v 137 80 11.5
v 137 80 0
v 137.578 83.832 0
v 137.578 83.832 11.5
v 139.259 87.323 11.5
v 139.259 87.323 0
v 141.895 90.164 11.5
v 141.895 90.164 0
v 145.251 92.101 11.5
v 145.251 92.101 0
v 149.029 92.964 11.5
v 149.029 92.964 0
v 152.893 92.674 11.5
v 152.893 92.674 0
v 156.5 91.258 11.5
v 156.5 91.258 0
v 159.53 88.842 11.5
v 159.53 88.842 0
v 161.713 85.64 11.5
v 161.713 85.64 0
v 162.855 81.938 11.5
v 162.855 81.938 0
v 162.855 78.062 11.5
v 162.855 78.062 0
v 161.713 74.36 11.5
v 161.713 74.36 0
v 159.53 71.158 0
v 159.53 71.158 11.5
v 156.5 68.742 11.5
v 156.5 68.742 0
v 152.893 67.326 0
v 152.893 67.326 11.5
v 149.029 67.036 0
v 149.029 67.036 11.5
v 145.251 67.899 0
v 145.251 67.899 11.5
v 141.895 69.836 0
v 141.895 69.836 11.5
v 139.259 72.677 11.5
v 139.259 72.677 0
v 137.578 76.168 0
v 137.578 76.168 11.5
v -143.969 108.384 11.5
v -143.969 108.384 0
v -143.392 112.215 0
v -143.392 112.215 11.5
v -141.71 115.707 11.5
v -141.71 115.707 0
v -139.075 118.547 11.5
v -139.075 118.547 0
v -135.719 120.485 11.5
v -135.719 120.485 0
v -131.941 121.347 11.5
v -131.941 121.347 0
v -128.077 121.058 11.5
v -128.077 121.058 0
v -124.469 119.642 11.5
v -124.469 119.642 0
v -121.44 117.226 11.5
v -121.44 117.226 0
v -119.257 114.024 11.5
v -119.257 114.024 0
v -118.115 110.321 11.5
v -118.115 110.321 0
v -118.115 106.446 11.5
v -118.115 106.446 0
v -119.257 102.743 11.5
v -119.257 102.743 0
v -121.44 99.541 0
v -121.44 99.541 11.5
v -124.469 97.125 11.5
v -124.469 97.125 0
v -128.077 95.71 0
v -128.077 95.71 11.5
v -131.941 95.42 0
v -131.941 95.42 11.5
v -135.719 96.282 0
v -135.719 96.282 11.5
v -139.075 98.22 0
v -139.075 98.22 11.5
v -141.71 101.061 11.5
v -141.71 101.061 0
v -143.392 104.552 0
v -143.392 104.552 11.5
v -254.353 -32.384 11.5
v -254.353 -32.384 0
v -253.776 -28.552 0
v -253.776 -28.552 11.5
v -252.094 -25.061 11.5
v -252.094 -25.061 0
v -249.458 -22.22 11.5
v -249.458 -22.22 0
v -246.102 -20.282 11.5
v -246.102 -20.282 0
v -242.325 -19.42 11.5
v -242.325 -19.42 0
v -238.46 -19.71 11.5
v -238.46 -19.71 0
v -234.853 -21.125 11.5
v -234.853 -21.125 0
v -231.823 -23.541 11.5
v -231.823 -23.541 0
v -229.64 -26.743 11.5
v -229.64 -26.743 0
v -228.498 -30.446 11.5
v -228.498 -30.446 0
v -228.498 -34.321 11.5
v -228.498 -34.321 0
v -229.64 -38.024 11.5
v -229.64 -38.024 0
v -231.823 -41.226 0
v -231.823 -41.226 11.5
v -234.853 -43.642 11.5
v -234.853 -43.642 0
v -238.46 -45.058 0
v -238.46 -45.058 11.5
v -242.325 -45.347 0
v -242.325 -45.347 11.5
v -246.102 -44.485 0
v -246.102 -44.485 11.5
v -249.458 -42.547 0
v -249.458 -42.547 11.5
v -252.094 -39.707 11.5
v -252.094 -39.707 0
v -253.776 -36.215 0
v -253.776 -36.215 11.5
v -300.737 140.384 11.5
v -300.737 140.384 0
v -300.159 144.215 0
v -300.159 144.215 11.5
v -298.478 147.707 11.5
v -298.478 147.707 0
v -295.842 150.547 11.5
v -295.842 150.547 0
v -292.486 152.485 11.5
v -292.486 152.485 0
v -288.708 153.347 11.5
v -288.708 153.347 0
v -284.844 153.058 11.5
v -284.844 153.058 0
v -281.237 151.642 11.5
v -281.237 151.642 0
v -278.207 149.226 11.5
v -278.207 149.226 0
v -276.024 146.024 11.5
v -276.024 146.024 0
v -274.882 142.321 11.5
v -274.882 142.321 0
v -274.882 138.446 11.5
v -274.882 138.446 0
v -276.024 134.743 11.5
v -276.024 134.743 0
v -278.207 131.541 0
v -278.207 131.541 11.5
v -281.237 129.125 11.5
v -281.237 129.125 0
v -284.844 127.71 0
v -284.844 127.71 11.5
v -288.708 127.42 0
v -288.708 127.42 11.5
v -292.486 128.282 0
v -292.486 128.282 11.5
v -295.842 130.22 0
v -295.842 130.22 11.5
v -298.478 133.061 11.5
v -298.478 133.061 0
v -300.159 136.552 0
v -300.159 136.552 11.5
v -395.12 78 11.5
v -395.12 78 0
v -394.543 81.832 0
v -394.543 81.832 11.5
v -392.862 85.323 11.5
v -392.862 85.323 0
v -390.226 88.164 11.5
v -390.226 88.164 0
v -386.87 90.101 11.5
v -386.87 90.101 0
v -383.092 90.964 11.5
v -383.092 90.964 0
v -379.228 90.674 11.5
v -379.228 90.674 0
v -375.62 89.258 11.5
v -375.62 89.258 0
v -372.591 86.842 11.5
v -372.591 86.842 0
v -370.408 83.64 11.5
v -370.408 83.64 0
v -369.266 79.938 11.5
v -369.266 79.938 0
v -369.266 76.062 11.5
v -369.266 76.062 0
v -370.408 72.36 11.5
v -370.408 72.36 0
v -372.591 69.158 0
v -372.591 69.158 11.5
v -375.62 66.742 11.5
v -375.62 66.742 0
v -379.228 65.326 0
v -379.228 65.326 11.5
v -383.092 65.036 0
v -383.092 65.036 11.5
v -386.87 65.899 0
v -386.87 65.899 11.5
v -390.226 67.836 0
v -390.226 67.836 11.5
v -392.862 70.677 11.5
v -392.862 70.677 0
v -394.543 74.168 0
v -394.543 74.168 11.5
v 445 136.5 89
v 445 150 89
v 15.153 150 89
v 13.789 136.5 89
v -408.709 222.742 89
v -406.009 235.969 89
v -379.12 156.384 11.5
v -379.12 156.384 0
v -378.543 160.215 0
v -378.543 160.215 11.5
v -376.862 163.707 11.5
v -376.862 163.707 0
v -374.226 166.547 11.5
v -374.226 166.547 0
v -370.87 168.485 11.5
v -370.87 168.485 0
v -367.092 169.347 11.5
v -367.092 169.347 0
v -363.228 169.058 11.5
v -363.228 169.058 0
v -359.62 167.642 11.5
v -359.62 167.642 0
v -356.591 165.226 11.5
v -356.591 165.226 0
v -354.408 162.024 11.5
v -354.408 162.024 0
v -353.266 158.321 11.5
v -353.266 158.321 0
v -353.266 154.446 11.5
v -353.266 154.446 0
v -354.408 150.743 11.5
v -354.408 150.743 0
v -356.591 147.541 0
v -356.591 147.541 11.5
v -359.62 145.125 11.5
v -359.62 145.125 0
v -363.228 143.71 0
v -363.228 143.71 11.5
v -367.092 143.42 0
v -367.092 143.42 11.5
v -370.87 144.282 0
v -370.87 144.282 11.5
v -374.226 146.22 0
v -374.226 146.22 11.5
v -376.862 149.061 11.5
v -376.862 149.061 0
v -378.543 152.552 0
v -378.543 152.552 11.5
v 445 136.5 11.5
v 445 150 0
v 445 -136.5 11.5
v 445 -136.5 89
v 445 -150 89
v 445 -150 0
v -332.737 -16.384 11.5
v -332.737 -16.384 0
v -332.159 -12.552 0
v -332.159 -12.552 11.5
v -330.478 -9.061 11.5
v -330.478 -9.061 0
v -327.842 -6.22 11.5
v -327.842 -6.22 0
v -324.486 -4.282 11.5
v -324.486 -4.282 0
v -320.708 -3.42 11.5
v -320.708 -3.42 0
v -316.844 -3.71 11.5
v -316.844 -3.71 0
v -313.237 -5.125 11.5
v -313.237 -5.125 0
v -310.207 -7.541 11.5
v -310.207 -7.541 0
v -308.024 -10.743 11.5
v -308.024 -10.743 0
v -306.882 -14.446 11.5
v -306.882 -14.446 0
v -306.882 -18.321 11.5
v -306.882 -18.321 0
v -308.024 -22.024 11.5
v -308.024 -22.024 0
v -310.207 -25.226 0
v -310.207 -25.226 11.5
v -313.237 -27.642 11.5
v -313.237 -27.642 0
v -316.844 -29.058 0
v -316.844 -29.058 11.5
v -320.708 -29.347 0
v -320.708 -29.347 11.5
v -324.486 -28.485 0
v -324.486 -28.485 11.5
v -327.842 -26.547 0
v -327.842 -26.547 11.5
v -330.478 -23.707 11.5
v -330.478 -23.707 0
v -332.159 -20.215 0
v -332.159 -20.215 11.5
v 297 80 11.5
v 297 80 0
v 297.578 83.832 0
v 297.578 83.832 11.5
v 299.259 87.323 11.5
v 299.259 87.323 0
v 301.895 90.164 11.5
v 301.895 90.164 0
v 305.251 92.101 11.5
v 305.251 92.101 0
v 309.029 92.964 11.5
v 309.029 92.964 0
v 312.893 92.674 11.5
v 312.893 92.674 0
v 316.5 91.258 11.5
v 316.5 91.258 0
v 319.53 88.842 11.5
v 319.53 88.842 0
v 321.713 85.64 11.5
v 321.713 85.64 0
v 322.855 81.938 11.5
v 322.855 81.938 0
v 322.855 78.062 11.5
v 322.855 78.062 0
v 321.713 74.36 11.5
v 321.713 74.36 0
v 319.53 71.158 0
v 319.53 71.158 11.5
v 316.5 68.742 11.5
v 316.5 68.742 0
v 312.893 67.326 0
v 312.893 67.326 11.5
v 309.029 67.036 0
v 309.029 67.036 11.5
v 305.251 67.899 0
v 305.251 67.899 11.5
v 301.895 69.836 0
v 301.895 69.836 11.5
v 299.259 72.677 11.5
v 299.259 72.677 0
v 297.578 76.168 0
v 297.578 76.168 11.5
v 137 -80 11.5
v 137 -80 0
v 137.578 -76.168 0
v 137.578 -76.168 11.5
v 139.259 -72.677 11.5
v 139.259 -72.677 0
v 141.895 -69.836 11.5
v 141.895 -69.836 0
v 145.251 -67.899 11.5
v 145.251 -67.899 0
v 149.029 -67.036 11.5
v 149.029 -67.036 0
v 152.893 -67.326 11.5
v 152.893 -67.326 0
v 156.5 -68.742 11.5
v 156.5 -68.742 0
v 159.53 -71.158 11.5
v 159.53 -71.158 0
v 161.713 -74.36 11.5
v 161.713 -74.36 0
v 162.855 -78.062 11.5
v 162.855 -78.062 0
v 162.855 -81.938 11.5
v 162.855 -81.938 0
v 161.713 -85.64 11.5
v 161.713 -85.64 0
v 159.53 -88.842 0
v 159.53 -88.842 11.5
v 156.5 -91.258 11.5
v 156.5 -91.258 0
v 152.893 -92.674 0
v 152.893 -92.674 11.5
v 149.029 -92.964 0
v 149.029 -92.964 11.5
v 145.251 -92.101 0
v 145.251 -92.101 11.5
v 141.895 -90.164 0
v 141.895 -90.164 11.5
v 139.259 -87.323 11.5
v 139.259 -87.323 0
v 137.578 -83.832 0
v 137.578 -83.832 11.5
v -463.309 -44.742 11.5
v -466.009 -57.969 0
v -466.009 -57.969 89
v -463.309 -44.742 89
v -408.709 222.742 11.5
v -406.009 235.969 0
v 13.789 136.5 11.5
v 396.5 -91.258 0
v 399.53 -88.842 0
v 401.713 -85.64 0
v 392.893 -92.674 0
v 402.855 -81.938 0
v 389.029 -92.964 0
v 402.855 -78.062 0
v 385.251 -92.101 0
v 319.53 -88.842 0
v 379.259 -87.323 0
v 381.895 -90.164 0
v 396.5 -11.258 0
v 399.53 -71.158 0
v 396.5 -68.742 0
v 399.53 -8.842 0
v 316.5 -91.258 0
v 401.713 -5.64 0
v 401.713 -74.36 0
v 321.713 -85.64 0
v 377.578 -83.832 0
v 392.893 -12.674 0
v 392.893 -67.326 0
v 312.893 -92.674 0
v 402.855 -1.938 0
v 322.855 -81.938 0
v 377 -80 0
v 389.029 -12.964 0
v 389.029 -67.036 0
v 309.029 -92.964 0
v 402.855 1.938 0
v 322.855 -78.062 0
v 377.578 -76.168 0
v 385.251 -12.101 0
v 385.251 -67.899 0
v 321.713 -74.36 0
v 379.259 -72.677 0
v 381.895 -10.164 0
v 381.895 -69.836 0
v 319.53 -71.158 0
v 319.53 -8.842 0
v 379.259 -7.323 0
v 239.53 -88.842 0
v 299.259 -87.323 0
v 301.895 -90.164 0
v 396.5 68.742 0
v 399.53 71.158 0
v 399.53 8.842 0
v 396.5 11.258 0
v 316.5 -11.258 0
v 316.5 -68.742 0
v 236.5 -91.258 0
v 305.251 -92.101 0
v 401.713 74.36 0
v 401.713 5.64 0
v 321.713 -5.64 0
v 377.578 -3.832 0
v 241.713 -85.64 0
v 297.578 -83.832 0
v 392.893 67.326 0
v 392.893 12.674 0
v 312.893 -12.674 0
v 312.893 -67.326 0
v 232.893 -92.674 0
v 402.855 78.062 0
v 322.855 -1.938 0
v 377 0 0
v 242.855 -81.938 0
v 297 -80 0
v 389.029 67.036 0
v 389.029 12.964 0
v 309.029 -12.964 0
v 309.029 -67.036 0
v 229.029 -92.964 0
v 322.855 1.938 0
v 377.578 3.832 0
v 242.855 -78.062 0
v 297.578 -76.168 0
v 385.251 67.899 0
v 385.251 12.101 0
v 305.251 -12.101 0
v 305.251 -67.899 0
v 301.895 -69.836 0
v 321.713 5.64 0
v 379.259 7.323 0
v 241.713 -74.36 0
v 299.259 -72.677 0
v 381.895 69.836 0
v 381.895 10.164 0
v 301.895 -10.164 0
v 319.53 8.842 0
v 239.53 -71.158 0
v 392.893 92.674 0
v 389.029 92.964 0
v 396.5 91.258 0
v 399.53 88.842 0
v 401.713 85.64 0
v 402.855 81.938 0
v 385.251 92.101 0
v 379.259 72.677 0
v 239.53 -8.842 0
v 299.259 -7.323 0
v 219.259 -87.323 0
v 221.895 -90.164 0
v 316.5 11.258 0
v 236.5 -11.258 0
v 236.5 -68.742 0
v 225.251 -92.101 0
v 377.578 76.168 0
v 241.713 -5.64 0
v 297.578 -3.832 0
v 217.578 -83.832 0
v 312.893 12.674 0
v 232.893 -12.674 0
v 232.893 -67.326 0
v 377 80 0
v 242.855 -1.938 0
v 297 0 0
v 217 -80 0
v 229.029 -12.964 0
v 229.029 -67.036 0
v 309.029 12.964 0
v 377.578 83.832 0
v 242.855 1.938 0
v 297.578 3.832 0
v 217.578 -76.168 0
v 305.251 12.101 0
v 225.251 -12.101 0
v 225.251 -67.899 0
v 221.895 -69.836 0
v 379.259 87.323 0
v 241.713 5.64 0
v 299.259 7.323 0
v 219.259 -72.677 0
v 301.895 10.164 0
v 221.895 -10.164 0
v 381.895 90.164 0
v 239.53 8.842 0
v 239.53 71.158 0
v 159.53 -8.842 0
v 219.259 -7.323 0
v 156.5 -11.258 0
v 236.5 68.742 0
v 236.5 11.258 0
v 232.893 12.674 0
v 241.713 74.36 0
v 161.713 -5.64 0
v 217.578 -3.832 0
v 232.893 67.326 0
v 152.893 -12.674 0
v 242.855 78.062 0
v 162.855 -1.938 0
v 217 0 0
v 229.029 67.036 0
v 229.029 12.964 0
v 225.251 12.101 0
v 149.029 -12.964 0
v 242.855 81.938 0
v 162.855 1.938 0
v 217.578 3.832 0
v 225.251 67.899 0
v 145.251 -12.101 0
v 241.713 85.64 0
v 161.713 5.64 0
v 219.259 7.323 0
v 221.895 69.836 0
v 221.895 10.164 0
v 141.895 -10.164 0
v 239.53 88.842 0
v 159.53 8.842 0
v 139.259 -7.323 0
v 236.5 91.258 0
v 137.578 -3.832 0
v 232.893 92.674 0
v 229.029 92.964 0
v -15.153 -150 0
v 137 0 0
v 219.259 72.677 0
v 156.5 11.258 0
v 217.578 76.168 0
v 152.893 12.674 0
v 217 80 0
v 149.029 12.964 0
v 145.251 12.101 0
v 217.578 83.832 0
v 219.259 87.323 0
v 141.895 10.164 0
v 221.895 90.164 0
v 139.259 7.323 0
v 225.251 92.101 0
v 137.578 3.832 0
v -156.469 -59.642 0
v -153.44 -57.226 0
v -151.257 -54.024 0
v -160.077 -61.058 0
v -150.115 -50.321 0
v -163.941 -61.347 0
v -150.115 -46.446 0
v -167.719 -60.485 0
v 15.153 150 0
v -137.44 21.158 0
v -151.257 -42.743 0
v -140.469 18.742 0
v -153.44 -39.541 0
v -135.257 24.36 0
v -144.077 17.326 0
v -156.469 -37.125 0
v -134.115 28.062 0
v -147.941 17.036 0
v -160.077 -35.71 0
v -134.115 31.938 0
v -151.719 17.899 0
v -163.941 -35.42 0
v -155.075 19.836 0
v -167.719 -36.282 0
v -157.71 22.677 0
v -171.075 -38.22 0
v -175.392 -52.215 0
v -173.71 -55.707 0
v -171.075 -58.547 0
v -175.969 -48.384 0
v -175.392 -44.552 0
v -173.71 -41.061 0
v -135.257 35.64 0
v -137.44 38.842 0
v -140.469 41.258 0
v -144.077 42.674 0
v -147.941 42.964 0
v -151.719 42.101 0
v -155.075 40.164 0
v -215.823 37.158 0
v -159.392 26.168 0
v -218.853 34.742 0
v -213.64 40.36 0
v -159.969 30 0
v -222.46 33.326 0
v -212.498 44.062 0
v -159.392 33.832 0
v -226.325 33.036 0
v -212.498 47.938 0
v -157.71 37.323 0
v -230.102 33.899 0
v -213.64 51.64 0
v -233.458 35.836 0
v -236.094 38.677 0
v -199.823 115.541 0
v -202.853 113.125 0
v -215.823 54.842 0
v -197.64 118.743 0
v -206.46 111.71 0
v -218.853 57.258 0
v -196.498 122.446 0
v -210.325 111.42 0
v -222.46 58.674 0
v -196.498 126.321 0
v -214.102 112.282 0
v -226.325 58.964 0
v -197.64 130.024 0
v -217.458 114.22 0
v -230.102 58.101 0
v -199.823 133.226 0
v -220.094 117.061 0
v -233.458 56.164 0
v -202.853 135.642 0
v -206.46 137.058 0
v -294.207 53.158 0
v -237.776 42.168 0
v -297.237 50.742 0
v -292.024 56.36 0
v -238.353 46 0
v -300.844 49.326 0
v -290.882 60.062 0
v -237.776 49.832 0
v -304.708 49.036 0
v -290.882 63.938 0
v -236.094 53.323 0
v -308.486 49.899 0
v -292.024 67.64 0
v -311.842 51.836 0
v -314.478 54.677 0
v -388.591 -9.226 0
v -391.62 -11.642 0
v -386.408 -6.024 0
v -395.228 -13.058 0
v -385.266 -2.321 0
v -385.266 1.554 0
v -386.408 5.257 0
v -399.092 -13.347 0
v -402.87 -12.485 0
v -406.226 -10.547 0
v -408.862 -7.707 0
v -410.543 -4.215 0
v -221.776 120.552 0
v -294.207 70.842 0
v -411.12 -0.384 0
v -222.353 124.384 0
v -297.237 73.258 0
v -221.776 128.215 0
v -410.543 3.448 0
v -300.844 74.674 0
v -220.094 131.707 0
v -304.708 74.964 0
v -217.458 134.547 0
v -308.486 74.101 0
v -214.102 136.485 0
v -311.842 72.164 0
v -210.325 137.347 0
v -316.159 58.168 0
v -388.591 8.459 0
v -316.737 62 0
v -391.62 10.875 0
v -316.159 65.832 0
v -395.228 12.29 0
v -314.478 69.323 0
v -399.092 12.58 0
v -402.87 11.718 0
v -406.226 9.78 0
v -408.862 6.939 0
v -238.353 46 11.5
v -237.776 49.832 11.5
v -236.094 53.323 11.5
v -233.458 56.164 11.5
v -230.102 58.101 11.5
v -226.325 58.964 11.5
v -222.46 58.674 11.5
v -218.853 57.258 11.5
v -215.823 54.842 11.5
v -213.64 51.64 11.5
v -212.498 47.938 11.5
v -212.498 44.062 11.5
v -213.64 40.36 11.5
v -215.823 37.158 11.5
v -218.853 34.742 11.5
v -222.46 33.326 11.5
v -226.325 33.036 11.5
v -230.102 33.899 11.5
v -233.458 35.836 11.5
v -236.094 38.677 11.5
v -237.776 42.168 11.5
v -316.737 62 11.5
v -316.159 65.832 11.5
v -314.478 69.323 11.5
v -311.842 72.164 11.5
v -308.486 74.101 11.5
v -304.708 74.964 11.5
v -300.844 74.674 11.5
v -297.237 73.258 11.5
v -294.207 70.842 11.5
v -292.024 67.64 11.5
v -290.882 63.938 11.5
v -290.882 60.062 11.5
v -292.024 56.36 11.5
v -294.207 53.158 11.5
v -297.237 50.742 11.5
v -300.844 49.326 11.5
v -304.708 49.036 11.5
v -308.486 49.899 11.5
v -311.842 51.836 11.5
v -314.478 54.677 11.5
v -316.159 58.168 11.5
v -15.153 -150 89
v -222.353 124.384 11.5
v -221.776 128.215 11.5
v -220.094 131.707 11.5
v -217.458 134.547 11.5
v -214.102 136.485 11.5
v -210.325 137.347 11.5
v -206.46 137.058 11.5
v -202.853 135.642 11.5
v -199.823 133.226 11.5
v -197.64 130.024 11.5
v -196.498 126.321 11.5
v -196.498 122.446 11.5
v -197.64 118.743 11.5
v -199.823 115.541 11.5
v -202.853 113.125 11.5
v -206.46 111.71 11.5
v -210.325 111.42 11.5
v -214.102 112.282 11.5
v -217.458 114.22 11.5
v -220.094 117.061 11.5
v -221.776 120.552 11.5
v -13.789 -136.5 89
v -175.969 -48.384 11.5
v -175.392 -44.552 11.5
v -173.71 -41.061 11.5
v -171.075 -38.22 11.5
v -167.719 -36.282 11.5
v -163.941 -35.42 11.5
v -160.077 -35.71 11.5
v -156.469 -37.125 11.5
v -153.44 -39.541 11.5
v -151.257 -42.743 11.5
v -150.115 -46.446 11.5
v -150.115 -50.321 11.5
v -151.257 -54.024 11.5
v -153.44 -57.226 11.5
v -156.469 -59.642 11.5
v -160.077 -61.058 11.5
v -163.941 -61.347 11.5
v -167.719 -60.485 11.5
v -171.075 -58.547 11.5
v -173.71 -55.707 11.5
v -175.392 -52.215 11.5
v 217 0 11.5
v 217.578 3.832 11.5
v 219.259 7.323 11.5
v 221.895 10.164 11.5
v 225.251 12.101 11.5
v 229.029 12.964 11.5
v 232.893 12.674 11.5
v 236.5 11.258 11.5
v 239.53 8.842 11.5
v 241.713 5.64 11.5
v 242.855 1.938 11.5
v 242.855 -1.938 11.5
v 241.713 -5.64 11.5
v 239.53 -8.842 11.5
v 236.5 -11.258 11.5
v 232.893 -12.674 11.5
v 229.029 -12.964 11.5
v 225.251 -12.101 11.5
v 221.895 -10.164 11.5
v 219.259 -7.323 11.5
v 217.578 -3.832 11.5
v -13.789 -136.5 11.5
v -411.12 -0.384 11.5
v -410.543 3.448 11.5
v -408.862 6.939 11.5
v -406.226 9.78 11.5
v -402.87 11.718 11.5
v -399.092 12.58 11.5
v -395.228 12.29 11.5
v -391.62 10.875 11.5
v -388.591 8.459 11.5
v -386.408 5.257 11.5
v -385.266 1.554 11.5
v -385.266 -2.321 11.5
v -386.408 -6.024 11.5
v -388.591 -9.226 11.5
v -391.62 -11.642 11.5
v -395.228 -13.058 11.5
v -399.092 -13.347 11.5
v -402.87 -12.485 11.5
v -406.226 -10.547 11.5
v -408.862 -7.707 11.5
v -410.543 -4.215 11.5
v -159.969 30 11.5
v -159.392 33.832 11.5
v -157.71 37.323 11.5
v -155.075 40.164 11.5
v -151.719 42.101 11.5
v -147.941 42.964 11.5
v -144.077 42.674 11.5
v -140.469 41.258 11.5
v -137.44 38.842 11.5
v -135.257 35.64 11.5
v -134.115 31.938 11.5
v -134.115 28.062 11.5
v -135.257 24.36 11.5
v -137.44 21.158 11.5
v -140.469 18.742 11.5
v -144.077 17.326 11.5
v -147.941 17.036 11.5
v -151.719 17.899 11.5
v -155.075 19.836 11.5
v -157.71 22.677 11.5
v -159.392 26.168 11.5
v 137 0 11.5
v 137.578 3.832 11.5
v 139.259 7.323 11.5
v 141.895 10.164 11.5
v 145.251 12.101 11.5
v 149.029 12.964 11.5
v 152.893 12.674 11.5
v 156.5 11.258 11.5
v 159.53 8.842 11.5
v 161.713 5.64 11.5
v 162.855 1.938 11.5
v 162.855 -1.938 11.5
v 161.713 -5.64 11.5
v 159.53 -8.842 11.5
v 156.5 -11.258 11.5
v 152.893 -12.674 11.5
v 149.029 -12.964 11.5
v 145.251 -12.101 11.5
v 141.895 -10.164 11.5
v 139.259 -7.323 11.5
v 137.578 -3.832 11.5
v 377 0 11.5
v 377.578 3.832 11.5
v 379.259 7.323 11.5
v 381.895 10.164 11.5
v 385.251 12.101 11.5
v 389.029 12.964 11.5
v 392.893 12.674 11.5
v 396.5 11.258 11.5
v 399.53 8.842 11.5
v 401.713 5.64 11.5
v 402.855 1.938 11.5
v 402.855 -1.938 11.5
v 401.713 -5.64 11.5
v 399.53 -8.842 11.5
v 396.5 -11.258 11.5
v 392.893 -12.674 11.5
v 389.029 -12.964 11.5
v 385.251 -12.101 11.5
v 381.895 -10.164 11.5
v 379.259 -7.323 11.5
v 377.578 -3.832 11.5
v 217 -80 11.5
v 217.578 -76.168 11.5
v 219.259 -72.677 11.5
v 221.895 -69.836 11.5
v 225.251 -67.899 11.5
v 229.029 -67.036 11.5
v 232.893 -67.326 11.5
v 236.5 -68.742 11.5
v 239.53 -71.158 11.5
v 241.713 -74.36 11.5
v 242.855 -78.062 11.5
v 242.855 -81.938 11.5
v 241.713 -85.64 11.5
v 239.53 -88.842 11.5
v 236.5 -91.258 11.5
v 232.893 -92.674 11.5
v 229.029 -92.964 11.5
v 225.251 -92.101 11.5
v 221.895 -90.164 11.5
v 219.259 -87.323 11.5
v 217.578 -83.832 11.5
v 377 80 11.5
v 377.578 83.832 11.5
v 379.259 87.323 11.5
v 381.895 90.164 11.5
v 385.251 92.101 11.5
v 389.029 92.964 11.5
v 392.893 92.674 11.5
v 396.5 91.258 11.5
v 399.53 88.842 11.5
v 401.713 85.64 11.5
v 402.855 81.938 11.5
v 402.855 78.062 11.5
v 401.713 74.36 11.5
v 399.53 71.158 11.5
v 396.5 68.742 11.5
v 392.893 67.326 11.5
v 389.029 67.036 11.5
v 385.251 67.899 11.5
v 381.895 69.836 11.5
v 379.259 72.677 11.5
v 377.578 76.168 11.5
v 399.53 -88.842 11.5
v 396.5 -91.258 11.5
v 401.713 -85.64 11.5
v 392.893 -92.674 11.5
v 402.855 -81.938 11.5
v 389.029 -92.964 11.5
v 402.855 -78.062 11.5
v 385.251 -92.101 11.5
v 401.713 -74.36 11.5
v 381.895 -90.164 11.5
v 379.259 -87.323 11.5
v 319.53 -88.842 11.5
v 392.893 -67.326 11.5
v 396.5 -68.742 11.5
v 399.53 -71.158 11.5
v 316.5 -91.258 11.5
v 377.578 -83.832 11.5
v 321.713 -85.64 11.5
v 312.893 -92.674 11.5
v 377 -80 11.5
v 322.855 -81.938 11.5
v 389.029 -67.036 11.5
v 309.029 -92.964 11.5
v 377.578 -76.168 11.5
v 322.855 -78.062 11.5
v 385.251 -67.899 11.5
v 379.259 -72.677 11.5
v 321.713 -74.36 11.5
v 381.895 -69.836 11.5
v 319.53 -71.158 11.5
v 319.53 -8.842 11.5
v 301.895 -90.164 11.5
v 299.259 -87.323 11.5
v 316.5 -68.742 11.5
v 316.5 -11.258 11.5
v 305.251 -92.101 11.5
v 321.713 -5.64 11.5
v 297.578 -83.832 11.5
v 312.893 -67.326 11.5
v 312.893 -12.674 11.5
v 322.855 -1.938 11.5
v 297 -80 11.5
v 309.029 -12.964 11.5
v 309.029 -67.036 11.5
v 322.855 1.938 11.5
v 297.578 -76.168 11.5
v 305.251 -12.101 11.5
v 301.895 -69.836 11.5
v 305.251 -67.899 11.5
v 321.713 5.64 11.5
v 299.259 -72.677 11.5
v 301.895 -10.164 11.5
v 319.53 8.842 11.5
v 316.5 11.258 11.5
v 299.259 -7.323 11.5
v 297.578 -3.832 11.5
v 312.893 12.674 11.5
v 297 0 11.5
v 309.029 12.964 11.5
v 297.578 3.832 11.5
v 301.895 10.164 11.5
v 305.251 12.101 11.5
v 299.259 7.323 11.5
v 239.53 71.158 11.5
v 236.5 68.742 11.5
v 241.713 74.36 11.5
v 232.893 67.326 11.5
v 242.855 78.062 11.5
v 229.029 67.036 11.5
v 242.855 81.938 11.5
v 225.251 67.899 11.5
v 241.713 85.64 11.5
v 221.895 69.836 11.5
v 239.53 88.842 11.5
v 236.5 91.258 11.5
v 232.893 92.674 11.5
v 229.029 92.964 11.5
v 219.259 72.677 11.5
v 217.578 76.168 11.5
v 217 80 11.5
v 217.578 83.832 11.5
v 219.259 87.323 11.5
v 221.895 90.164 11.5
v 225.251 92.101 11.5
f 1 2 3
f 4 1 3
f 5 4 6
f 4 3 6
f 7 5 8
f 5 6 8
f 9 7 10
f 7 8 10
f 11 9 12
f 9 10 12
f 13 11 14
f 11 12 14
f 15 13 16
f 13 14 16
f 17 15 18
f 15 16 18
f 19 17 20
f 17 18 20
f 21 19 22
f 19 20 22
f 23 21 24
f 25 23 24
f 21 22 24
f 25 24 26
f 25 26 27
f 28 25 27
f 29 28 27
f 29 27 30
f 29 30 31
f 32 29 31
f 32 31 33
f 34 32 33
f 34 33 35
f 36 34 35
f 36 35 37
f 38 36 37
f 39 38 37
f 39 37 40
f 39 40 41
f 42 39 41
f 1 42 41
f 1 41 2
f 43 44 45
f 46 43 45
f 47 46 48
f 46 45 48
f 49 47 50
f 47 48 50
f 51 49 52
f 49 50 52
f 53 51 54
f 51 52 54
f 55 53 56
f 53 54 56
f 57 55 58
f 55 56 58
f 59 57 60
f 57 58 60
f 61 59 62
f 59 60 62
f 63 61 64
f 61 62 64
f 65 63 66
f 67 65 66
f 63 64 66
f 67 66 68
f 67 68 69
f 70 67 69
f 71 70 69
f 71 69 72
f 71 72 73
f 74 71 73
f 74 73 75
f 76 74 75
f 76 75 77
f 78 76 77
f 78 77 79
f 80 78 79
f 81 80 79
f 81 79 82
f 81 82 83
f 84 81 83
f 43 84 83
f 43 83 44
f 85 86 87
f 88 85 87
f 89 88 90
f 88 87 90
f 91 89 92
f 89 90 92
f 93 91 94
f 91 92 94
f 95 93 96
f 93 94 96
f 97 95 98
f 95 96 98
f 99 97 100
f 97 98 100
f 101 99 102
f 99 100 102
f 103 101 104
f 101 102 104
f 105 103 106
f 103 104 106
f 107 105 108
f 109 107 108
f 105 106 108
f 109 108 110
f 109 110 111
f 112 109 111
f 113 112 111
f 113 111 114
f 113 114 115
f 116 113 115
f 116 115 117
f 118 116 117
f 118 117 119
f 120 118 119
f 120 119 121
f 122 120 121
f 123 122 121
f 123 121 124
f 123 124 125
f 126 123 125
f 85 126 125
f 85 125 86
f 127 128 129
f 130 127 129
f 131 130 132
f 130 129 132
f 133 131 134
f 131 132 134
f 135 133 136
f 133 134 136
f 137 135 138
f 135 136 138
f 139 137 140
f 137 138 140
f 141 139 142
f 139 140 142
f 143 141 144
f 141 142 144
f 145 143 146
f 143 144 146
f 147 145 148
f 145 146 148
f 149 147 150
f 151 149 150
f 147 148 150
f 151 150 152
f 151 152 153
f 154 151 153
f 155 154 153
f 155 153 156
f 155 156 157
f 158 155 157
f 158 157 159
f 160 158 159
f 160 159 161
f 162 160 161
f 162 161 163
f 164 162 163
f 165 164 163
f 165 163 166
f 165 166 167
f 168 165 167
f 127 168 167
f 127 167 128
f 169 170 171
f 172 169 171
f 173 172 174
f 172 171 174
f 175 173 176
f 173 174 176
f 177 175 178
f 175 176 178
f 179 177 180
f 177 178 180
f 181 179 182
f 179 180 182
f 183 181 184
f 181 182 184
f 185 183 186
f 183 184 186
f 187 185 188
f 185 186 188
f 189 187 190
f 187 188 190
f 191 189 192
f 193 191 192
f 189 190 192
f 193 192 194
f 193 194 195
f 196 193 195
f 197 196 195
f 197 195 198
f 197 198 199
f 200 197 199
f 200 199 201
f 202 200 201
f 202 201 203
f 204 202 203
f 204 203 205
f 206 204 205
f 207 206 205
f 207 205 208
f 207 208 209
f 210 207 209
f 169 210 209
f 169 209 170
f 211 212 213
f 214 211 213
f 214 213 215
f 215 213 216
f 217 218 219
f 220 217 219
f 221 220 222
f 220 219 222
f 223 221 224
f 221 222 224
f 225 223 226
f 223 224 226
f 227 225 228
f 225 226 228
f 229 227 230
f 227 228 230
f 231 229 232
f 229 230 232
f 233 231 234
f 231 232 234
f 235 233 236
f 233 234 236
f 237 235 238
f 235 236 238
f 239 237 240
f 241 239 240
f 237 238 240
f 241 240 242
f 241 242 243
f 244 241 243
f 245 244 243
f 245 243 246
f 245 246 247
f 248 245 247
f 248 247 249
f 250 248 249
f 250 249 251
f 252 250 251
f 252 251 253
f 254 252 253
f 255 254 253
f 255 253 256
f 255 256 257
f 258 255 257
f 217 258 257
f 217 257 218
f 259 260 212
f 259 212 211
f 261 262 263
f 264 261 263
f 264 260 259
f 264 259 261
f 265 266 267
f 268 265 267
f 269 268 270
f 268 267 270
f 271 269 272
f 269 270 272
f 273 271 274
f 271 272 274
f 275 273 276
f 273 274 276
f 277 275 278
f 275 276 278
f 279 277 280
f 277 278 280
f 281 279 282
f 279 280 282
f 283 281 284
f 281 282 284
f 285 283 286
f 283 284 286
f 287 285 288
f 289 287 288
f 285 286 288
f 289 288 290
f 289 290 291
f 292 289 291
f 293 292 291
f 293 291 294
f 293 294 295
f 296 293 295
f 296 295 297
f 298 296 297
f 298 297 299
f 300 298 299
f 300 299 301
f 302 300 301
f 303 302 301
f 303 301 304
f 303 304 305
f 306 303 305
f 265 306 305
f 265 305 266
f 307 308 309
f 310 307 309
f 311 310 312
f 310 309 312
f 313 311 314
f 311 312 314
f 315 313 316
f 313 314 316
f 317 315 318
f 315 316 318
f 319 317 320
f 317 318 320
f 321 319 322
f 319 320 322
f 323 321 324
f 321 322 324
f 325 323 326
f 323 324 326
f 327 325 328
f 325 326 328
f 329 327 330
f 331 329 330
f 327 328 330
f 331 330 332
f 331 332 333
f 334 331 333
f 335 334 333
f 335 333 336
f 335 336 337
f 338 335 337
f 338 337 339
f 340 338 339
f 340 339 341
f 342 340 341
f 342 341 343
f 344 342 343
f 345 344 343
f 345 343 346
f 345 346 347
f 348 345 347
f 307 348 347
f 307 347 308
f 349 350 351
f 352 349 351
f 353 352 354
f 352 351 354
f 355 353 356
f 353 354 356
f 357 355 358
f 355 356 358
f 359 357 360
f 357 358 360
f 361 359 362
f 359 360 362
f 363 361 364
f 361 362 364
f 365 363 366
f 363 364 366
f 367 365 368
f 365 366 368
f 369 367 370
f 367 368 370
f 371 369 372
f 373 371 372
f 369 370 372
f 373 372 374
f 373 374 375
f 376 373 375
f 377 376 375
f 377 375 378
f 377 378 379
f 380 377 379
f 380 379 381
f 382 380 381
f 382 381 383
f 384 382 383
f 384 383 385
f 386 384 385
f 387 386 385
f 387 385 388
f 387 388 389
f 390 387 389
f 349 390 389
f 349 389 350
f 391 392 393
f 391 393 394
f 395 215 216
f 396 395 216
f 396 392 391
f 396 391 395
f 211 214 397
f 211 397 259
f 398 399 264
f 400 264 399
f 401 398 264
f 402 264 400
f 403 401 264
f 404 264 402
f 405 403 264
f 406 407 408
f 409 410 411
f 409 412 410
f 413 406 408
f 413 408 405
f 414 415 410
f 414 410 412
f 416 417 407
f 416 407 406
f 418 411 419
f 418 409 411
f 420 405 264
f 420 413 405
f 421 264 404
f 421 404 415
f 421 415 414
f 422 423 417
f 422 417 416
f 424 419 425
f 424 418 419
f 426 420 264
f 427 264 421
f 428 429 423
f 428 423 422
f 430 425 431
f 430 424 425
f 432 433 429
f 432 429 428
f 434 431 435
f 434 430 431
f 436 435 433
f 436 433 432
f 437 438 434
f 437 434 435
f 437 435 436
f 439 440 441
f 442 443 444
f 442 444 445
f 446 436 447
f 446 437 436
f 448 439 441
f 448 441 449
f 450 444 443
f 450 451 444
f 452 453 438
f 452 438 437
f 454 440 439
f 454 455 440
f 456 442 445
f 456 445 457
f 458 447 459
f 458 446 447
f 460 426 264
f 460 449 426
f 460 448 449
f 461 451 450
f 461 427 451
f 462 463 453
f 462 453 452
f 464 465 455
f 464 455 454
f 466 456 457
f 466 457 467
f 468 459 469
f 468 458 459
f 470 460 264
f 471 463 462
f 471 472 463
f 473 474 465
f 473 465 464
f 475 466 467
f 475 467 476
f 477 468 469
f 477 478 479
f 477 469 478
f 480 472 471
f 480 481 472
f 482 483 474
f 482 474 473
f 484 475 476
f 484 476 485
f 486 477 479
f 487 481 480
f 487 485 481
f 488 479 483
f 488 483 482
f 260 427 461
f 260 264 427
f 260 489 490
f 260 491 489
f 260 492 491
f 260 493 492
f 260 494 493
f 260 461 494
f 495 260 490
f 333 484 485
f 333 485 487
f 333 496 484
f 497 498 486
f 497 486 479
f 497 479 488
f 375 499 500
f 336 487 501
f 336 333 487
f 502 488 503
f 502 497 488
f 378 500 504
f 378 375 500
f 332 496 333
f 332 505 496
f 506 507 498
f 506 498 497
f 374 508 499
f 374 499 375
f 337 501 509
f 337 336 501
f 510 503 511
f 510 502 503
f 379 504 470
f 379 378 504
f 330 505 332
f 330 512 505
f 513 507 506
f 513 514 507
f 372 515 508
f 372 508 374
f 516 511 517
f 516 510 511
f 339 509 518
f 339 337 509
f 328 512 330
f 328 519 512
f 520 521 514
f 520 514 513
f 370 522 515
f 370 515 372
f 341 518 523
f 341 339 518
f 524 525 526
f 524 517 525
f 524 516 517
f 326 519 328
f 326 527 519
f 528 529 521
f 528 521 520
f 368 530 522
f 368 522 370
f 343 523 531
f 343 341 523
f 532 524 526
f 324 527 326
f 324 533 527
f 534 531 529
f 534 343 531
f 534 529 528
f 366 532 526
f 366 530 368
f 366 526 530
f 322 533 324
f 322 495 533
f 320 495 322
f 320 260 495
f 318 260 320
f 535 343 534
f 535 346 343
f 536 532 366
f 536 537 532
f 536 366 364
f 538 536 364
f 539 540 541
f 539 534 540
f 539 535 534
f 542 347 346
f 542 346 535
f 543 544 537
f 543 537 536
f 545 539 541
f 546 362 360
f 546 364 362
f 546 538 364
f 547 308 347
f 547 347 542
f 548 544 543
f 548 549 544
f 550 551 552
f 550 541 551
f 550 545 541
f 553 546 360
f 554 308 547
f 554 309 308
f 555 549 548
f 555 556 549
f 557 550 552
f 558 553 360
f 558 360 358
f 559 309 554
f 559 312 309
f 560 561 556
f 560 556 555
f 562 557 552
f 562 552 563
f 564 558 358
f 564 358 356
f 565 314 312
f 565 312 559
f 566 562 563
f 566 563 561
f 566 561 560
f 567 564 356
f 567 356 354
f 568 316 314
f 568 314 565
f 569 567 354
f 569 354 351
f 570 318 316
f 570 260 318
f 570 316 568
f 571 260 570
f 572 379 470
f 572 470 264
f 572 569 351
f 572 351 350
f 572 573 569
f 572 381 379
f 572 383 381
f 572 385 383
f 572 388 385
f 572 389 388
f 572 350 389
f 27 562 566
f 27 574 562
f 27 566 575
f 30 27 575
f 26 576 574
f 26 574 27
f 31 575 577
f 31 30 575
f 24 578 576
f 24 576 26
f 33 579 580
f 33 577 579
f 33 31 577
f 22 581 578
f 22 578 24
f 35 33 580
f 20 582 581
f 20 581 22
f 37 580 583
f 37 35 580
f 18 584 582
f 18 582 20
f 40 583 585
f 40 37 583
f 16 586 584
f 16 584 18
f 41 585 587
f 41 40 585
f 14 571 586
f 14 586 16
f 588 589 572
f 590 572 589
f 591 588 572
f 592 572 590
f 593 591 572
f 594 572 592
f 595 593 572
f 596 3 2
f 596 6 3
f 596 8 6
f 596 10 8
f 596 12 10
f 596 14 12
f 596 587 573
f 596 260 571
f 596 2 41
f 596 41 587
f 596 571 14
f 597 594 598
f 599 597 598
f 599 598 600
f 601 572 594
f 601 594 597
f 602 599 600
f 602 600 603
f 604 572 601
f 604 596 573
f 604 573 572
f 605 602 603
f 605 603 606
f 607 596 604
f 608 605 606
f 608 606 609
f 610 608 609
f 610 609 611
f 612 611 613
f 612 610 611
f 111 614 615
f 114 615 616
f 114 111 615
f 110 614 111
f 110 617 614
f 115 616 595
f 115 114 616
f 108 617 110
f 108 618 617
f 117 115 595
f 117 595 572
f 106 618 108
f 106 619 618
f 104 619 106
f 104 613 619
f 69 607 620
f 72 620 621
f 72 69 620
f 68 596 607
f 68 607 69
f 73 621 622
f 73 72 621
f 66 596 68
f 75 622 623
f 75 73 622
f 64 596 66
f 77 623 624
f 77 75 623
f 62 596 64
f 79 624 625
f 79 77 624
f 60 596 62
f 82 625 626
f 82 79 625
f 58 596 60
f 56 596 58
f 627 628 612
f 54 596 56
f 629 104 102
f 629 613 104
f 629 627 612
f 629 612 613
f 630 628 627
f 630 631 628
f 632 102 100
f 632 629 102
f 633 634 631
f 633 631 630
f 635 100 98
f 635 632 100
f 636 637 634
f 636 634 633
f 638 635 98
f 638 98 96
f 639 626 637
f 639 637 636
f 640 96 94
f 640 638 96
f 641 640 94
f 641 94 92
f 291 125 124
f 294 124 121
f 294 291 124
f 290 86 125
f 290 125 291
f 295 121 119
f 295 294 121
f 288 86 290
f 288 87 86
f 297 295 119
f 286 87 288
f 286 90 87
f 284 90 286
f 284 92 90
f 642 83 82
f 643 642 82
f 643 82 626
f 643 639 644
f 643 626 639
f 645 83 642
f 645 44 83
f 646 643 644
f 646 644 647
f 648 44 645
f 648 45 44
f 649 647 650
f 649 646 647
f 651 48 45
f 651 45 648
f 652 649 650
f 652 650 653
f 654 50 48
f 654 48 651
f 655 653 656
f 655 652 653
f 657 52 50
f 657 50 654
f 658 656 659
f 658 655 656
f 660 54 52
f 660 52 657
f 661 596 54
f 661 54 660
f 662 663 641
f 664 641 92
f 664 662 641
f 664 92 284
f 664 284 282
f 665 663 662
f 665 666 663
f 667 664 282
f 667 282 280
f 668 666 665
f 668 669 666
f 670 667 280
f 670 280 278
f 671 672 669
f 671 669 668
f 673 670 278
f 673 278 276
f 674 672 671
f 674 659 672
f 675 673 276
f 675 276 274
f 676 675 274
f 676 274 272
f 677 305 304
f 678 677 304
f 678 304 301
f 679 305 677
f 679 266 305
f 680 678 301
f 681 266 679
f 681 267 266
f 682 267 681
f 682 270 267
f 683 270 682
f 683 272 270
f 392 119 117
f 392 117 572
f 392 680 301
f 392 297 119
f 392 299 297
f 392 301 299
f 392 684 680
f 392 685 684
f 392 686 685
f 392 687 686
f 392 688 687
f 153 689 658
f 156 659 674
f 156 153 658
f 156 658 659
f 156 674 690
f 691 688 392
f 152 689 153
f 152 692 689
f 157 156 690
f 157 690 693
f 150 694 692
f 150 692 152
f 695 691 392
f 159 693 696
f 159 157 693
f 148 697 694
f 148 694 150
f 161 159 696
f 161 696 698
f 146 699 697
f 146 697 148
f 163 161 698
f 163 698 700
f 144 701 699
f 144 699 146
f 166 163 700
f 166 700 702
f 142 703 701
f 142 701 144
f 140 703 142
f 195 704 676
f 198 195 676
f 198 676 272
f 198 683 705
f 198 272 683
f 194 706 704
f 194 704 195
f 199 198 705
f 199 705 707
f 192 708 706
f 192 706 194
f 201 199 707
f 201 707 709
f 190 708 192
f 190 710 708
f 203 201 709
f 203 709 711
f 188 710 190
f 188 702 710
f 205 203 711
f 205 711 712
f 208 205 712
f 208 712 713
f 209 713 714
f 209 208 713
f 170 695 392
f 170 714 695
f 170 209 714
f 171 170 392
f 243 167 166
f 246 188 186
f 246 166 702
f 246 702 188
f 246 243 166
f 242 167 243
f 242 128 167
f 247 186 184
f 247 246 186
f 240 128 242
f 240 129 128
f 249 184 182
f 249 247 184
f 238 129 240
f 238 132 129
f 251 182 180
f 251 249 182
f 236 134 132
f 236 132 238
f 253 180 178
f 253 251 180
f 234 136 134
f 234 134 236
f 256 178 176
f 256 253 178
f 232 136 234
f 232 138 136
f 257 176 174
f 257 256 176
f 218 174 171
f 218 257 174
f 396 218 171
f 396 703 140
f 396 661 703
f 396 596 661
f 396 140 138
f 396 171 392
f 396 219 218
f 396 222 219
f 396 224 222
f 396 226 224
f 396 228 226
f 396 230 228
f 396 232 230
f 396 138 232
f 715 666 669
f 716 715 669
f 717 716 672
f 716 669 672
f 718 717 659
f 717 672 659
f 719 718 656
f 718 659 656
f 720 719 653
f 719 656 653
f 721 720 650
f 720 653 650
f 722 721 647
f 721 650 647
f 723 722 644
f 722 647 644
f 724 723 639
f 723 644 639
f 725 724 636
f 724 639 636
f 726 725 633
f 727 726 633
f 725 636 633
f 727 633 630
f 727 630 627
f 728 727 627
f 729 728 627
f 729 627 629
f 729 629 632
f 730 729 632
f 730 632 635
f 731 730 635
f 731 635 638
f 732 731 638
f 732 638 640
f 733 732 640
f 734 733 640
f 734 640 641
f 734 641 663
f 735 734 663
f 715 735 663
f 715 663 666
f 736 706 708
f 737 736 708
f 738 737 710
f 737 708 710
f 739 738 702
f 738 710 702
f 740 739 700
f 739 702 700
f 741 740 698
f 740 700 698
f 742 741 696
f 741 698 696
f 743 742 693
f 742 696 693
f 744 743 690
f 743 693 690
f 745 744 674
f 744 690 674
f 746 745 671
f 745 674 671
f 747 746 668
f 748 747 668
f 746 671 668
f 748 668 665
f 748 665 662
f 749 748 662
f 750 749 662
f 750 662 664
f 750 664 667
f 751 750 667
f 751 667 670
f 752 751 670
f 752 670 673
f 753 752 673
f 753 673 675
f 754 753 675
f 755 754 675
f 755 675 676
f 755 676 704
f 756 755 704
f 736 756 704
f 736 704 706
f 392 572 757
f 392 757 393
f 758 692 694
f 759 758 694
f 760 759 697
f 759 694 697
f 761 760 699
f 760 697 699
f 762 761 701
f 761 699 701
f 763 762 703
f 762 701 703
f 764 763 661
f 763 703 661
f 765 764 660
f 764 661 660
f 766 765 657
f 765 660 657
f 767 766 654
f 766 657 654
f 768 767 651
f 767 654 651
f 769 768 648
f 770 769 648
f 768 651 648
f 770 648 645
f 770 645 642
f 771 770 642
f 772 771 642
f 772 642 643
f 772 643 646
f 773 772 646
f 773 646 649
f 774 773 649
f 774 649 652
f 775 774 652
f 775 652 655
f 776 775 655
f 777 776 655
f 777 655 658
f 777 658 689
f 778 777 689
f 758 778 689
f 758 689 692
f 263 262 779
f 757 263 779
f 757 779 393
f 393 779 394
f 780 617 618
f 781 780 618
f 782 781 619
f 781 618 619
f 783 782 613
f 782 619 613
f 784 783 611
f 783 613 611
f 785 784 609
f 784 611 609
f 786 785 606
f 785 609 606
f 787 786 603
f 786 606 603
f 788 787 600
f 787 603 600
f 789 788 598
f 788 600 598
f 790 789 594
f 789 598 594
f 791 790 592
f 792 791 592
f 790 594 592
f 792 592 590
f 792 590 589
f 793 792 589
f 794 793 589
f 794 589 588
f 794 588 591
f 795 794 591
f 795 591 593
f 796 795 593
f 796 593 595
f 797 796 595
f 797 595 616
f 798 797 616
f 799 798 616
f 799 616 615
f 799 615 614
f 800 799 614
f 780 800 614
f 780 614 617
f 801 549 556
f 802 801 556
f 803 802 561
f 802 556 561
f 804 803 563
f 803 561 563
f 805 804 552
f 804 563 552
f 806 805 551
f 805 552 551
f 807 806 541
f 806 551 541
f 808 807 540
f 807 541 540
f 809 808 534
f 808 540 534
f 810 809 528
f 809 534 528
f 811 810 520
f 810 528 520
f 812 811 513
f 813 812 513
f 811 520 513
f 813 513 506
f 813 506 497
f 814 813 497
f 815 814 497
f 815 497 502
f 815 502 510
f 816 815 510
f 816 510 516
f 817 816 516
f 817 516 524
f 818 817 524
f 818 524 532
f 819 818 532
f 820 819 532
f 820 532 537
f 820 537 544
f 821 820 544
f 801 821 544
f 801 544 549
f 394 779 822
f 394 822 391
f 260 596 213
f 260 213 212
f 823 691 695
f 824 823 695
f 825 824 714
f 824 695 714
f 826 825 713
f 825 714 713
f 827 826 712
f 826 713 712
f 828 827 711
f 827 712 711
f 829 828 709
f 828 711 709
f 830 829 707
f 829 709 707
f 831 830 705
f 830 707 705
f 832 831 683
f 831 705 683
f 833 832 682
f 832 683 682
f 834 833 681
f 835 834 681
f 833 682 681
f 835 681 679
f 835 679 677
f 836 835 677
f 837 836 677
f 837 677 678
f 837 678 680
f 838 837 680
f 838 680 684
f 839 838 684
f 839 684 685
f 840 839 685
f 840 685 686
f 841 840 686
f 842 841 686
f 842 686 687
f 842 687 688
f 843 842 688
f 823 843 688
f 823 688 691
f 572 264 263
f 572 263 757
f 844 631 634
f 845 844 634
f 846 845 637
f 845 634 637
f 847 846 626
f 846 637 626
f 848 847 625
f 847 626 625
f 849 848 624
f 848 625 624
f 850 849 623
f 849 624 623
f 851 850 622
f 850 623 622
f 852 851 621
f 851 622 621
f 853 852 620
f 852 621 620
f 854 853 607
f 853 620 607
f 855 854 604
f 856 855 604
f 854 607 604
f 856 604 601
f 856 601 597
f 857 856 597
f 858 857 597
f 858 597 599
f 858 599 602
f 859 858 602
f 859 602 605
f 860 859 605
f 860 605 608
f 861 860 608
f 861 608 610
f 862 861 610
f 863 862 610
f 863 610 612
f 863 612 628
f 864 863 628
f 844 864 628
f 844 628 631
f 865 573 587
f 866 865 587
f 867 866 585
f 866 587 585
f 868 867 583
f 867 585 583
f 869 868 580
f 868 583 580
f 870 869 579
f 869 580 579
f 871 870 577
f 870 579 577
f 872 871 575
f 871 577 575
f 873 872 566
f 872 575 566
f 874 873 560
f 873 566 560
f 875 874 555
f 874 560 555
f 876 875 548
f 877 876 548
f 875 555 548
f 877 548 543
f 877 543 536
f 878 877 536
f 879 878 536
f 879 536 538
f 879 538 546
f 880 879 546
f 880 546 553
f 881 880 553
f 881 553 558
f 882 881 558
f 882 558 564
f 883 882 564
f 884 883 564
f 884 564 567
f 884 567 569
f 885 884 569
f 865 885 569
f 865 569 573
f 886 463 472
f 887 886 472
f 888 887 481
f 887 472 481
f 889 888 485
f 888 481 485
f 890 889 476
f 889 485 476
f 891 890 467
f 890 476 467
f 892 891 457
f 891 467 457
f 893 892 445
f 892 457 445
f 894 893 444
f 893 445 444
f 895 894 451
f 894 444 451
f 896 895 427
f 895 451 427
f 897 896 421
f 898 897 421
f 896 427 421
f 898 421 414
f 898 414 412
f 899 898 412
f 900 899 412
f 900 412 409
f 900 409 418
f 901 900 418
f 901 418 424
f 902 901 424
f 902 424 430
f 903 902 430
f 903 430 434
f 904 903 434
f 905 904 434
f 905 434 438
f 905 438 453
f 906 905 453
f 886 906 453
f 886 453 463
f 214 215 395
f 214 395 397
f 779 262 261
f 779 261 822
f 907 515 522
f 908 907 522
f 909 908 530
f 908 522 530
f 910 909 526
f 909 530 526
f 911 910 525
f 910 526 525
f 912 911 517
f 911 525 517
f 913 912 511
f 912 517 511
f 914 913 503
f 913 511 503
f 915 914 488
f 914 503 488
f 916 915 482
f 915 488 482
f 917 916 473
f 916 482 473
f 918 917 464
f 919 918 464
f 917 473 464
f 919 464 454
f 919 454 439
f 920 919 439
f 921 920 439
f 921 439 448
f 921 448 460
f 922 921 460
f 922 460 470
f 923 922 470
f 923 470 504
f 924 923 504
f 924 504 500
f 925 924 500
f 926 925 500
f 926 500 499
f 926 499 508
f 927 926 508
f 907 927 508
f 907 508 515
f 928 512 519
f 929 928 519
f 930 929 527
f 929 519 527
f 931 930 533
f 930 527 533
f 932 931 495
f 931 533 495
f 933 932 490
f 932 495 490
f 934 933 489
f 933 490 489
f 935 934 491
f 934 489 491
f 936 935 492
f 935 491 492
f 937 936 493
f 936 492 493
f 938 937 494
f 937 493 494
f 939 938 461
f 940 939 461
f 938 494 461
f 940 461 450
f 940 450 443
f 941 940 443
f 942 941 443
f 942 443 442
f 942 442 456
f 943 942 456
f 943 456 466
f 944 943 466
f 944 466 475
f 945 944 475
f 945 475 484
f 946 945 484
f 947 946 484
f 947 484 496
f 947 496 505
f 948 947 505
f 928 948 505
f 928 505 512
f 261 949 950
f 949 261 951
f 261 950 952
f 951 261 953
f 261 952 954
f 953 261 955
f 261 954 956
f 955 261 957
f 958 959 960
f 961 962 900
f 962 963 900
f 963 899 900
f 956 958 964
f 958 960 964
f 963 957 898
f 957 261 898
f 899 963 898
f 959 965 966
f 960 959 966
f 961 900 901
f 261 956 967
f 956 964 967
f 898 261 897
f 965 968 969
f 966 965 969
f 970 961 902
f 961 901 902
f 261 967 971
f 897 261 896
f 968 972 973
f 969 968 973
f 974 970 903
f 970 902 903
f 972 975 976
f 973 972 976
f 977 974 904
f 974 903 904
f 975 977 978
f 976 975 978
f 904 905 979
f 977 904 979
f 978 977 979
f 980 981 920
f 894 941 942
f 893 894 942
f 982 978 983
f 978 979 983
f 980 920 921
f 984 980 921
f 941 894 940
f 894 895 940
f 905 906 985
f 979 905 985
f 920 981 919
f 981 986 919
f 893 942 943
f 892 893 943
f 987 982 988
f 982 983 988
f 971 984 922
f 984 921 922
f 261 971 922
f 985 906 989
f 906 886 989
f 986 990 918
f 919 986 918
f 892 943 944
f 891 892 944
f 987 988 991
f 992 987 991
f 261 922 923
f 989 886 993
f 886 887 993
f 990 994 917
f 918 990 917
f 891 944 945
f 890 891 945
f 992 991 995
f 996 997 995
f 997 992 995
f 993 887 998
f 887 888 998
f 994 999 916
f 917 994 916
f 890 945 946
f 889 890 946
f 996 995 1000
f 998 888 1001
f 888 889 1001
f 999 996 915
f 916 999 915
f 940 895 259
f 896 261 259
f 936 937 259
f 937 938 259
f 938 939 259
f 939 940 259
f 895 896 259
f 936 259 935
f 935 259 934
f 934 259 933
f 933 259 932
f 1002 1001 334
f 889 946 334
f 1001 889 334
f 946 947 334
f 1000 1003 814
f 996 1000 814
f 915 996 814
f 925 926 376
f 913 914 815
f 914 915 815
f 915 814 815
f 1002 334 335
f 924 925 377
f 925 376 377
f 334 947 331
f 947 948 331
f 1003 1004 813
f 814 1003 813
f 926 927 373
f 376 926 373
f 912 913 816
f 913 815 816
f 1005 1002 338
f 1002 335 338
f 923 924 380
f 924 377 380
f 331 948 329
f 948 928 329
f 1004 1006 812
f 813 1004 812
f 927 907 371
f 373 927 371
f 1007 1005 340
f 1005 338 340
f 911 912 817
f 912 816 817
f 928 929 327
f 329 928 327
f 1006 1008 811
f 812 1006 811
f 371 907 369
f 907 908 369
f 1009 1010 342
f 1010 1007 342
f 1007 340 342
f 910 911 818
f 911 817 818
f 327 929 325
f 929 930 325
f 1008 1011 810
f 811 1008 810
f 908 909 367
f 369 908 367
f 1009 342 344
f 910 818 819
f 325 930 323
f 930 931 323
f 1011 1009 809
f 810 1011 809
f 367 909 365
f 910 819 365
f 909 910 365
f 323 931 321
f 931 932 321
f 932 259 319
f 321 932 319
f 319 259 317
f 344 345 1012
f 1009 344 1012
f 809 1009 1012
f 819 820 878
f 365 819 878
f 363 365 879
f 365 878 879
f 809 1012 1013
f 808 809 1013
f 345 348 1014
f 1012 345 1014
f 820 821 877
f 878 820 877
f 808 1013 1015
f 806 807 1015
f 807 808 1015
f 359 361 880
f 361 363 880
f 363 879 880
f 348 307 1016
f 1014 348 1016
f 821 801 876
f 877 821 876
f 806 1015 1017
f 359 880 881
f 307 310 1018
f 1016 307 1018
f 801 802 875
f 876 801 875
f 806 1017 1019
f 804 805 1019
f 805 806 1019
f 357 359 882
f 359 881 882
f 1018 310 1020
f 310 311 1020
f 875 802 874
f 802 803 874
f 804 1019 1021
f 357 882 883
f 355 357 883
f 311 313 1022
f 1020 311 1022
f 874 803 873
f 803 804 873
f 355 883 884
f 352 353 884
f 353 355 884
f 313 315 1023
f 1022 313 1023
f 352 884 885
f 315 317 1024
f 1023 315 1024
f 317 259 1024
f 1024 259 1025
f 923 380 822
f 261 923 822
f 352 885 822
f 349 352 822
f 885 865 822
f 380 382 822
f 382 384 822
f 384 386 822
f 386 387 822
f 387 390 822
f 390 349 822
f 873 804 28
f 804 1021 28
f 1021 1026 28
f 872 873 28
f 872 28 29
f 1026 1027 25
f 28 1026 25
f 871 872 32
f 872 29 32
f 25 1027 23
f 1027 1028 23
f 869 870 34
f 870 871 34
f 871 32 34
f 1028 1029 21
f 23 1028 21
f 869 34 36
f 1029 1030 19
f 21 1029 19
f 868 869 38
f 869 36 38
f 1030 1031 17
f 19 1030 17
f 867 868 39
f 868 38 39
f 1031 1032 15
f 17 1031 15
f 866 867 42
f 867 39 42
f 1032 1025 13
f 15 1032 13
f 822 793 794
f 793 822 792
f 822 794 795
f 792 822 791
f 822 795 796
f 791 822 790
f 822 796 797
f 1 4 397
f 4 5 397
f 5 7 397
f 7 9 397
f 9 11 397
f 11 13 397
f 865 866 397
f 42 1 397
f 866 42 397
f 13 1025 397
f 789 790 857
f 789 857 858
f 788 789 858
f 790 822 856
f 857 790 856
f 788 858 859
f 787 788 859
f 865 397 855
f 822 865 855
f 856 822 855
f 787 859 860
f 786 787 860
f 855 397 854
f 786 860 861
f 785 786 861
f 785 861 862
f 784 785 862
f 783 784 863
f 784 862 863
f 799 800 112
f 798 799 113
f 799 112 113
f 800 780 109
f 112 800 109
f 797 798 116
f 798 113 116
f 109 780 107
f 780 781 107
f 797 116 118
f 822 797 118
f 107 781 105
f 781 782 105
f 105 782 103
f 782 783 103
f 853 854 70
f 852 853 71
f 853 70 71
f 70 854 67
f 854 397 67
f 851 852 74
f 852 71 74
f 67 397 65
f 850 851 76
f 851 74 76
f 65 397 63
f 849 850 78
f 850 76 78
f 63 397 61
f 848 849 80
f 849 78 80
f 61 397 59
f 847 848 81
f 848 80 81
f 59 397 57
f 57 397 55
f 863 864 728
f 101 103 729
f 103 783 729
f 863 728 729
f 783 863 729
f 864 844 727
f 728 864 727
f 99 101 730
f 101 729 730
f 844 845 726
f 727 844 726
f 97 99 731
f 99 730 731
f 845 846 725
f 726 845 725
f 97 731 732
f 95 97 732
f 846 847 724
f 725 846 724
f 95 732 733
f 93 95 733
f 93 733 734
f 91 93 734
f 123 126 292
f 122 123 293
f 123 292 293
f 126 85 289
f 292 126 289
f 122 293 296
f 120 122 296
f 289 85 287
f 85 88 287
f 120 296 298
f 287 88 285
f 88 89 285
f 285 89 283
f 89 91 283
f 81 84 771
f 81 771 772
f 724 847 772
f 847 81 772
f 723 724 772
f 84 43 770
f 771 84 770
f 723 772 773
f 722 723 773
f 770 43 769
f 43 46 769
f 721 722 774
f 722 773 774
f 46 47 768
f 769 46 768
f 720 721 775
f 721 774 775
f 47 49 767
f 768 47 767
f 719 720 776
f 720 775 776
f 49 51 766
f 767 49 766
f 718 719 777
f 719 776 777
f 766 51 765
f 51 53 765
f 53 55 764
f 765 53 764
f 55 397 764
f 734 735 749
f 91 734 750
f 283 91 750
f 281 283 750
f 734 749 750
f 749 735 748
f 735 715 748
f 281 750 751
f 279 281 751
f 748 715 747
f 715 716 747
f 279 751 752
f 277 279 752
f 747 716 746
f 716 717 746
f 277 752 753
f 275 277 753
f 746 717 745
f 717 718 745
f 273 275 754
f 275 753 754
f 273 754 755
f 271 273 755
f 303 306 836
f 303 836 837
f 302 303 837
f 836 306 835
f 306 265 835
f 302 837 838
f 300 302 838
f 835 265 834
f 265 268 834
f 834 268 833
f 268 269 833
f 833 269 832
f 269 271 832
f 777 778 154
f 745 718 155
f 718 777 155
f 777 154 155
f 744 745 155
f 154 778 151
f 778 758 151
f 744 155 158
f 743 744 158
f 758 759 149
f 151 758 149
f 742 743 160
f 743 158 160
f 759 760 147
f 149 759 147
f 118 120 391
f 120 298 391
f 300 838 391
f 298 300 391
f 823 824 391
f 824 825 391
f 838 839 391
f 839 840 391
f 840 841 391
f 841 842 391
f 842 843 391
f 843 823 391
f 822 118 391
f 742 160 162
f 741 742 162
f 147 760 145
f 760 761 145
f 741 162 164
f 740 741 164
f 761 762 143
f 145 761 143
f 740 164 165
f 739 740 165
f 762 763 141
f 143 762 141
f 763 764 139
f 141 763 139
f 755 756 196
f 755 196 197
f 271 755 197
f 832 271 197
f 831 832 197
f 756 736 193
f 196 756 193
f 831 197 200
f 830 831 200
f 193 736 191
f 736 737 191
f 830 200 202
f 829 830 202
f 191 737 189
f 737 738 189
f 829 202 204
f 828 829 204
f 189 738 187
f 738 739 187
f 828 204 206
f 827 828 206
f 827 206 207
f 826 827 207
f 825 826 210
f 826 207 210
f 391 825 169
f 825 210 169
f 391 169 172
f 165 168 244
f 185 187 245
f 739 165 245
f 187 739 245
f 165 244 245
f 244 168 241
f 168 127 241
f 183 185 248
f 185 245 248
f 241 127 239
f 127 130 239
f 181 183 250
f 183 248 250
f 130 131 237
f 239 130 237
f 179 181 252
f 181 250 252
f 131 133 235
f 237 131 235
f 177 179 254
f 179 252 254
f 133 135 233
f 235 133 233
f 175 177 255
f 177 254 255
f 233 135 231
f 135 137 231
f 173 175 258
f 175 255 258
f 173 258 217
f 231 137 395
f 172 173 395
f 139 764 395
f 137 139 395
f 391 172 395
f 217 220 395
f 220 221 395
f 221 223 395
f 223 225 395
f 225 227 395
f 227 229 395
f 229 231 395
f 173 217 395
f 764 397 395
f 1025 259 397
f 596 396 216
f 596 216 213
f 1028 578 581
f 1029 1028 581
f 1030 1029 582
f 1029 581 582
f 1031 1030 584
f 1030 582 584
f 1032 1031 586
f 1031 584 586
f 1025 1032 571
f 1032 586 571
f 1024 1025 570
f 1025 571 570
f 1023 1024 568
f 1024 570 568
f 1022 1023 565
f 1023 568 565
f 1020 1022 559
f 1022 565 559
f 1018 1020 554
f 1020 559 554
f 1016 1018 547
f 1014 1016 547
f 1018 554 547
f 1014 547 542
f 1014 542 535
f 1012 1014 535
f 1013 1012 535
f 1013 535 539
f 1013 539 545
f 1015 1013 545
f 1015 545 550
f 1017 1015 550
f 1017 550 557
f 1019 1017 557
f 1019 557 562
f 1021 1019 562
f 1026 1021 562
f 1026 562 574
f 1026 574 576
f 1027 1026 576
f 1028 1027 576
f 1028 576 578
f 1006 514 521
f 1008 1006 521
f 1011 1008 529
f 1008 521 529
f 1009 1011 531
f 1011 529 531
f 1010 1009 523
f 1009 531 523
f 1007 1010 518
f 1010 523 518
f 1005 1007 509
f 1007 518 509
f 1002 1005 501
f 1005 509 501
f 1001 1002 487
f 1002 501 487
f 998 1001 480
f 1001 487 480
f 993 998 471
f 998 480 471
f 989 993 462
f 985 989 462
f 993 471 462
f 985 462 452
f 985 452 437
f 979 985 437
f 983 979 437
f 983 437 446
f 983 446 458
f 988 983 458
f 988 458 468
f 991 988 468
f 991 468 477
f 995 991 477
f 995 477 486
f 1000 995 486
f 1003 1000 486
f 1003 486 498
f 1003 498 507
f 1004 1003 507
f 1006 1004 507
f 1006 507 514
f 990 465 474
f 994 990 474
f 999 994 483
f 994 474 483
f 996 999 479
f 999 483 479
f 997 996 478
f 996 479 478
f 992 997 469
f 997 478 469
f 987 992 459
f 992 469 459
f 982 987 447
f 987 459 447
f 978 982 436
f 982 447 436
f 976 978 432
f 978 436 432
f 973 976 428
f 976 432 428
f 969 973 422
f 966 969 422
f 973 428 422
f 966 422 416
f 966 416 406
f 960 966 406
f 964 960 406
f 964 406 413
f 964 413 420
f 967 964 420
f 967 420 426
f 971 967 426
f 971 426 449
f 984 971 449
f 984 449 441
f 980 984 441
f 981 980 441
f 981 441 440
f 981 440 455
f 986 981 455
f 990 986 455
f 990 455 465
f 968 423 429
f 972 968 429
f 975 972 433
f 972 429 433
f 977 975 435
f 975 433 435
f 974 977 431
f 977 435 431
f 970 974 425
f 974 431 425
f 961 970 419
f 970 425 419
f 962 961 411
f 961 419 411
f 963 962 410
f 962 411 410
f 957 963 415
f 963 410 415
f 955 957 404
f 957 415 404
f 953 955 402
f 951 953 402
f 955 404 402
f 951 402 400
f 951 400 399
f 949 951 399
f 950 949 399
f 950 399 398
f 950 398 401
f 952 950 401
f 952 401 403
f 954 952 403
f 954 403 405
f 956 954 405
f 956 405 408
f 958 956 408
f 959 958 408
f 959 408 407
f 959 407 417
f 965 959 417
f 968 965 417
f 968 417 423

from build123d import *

# Parameters (mm, degrees)
EXTRUDE_1_DEPTH             = 89
CUT_EXTRUDE_1_DEPTH         = 77.5
SKETCH_4_R                  = 13
CUT_EXTRUDE_2_DEPTH         = 530.874608663
PATTERN_LINEAR_1_COUNT      = 4
PATTERN_LINEAR_1_PITCH      = 80
PATTERN_LINEAR_1_COUNT_DIR2 = 3
PATTERN_LINEAR_1_PITCH_DIR2 = 80
SKETCH_5_R                  = 13
CUT_EXTRUDE_3_DEPTH         = 530.874608663
PATTERN_LINEAR_2_COUNT      = 4
PATTERN_LINEAR_2_PITCH      = 80
PATTERN_LINEAR_2_COUNT_DIR2 = 3
PATTERN_LINEAR_2_PITCH_DIR2 = 80


with BuildPart() as part:
    # 草图2 → 凸台-拉伸1 (new body)
    with BuildSketch(Plane.XY):
        Polygon((15.153077165, 150), (445, 150), (445, -150), (-15.153077165, -150), (-466.009174215, -57.969384567), (-406.009174215, 235.969384567), align=None)
    extrude(amount=EXTRUDE_1_DEPTH)

    # 草图3 → 切除-拉伸1 (cut)
    with BuildSketch(Plane.XY.offset(89)):
        Polygon((-408.709174215, 222.742139956), (13.78930022, 136.5), (445, 136.5), (445, -136.5), (-13.78930022, -136.5), (-463.309174215, -44.742139956), align=None)
    extrude(amount=-CUT_EXTRUDE_1_DEPTH, mode=Mode.SUBTRACT)

    # 草图4 → 切除-拉伸2 (cut, through all)
    with BuildSketch(Plane(origin=(0, 0, 0), x_dir=(-1, 0, 0), z_dir=(0, 0, -1))):
        with Locations((-390, 80)):
            Circle(SKETCH_4_R)
    cut_extrude_2 = extrude(amount=-CUT_EXTRUDE_2_DEPTH, mode=Mode.SUBTRACT)

    # 阵列(线性)1: Cut-Extrude 2 4 × 3
    with Locations(*[(-i * PATTERN_LINEAR_1_PITCH, -j * PATTERN_LINEAR_1_PITCH_DIR2, 0) for i in range(PATTERN_LINEAR_1_COUNT) for j in range(PATTERN_LINEAR_1_COUNT_DIR2) if (i, j) != (0, 0)]):
        add(cut_extrude_2, mode=Mode.SUBTRACT)

    # 草图5 → 切除-拉伸3 (cut, through all)
    with BuildSketch(Plane(origin=(0, 0, 0), x_dir=(-1, 0, 0), z_dir=(0, 0, -1))):
        with Locations((366.120399874, 156.383671769)):
            Circle(SKETCH_5_R)
    cut_extrude_3 = extrude(amount=-CUT_EXTRUDE_3_DEPTH, mode=Mode.SUBTRACT)

    # 阵列(线性)2: Cut-Extrude 3 4 × 3
    with Locations(*[Vector(0.9797958971132713, -0.2000000000000002, 0) * (i * PATTERN_LINEAR_2_PITCH) + Vector(-0.20000000000000018, -0.9797958971132713, 0) * (j * PATTERN_LINEAR_2_PITCH_DIR2) for i in range(PATTERN_LINEAR_2_COUNT) for j in range(PATTERN_LINEAR_2_COUNT_DIR2) if (i, j) != (0, 0)]):
        add(cut_extrude_3, mode=Mode.SUBTRACT)


solid = part.part
